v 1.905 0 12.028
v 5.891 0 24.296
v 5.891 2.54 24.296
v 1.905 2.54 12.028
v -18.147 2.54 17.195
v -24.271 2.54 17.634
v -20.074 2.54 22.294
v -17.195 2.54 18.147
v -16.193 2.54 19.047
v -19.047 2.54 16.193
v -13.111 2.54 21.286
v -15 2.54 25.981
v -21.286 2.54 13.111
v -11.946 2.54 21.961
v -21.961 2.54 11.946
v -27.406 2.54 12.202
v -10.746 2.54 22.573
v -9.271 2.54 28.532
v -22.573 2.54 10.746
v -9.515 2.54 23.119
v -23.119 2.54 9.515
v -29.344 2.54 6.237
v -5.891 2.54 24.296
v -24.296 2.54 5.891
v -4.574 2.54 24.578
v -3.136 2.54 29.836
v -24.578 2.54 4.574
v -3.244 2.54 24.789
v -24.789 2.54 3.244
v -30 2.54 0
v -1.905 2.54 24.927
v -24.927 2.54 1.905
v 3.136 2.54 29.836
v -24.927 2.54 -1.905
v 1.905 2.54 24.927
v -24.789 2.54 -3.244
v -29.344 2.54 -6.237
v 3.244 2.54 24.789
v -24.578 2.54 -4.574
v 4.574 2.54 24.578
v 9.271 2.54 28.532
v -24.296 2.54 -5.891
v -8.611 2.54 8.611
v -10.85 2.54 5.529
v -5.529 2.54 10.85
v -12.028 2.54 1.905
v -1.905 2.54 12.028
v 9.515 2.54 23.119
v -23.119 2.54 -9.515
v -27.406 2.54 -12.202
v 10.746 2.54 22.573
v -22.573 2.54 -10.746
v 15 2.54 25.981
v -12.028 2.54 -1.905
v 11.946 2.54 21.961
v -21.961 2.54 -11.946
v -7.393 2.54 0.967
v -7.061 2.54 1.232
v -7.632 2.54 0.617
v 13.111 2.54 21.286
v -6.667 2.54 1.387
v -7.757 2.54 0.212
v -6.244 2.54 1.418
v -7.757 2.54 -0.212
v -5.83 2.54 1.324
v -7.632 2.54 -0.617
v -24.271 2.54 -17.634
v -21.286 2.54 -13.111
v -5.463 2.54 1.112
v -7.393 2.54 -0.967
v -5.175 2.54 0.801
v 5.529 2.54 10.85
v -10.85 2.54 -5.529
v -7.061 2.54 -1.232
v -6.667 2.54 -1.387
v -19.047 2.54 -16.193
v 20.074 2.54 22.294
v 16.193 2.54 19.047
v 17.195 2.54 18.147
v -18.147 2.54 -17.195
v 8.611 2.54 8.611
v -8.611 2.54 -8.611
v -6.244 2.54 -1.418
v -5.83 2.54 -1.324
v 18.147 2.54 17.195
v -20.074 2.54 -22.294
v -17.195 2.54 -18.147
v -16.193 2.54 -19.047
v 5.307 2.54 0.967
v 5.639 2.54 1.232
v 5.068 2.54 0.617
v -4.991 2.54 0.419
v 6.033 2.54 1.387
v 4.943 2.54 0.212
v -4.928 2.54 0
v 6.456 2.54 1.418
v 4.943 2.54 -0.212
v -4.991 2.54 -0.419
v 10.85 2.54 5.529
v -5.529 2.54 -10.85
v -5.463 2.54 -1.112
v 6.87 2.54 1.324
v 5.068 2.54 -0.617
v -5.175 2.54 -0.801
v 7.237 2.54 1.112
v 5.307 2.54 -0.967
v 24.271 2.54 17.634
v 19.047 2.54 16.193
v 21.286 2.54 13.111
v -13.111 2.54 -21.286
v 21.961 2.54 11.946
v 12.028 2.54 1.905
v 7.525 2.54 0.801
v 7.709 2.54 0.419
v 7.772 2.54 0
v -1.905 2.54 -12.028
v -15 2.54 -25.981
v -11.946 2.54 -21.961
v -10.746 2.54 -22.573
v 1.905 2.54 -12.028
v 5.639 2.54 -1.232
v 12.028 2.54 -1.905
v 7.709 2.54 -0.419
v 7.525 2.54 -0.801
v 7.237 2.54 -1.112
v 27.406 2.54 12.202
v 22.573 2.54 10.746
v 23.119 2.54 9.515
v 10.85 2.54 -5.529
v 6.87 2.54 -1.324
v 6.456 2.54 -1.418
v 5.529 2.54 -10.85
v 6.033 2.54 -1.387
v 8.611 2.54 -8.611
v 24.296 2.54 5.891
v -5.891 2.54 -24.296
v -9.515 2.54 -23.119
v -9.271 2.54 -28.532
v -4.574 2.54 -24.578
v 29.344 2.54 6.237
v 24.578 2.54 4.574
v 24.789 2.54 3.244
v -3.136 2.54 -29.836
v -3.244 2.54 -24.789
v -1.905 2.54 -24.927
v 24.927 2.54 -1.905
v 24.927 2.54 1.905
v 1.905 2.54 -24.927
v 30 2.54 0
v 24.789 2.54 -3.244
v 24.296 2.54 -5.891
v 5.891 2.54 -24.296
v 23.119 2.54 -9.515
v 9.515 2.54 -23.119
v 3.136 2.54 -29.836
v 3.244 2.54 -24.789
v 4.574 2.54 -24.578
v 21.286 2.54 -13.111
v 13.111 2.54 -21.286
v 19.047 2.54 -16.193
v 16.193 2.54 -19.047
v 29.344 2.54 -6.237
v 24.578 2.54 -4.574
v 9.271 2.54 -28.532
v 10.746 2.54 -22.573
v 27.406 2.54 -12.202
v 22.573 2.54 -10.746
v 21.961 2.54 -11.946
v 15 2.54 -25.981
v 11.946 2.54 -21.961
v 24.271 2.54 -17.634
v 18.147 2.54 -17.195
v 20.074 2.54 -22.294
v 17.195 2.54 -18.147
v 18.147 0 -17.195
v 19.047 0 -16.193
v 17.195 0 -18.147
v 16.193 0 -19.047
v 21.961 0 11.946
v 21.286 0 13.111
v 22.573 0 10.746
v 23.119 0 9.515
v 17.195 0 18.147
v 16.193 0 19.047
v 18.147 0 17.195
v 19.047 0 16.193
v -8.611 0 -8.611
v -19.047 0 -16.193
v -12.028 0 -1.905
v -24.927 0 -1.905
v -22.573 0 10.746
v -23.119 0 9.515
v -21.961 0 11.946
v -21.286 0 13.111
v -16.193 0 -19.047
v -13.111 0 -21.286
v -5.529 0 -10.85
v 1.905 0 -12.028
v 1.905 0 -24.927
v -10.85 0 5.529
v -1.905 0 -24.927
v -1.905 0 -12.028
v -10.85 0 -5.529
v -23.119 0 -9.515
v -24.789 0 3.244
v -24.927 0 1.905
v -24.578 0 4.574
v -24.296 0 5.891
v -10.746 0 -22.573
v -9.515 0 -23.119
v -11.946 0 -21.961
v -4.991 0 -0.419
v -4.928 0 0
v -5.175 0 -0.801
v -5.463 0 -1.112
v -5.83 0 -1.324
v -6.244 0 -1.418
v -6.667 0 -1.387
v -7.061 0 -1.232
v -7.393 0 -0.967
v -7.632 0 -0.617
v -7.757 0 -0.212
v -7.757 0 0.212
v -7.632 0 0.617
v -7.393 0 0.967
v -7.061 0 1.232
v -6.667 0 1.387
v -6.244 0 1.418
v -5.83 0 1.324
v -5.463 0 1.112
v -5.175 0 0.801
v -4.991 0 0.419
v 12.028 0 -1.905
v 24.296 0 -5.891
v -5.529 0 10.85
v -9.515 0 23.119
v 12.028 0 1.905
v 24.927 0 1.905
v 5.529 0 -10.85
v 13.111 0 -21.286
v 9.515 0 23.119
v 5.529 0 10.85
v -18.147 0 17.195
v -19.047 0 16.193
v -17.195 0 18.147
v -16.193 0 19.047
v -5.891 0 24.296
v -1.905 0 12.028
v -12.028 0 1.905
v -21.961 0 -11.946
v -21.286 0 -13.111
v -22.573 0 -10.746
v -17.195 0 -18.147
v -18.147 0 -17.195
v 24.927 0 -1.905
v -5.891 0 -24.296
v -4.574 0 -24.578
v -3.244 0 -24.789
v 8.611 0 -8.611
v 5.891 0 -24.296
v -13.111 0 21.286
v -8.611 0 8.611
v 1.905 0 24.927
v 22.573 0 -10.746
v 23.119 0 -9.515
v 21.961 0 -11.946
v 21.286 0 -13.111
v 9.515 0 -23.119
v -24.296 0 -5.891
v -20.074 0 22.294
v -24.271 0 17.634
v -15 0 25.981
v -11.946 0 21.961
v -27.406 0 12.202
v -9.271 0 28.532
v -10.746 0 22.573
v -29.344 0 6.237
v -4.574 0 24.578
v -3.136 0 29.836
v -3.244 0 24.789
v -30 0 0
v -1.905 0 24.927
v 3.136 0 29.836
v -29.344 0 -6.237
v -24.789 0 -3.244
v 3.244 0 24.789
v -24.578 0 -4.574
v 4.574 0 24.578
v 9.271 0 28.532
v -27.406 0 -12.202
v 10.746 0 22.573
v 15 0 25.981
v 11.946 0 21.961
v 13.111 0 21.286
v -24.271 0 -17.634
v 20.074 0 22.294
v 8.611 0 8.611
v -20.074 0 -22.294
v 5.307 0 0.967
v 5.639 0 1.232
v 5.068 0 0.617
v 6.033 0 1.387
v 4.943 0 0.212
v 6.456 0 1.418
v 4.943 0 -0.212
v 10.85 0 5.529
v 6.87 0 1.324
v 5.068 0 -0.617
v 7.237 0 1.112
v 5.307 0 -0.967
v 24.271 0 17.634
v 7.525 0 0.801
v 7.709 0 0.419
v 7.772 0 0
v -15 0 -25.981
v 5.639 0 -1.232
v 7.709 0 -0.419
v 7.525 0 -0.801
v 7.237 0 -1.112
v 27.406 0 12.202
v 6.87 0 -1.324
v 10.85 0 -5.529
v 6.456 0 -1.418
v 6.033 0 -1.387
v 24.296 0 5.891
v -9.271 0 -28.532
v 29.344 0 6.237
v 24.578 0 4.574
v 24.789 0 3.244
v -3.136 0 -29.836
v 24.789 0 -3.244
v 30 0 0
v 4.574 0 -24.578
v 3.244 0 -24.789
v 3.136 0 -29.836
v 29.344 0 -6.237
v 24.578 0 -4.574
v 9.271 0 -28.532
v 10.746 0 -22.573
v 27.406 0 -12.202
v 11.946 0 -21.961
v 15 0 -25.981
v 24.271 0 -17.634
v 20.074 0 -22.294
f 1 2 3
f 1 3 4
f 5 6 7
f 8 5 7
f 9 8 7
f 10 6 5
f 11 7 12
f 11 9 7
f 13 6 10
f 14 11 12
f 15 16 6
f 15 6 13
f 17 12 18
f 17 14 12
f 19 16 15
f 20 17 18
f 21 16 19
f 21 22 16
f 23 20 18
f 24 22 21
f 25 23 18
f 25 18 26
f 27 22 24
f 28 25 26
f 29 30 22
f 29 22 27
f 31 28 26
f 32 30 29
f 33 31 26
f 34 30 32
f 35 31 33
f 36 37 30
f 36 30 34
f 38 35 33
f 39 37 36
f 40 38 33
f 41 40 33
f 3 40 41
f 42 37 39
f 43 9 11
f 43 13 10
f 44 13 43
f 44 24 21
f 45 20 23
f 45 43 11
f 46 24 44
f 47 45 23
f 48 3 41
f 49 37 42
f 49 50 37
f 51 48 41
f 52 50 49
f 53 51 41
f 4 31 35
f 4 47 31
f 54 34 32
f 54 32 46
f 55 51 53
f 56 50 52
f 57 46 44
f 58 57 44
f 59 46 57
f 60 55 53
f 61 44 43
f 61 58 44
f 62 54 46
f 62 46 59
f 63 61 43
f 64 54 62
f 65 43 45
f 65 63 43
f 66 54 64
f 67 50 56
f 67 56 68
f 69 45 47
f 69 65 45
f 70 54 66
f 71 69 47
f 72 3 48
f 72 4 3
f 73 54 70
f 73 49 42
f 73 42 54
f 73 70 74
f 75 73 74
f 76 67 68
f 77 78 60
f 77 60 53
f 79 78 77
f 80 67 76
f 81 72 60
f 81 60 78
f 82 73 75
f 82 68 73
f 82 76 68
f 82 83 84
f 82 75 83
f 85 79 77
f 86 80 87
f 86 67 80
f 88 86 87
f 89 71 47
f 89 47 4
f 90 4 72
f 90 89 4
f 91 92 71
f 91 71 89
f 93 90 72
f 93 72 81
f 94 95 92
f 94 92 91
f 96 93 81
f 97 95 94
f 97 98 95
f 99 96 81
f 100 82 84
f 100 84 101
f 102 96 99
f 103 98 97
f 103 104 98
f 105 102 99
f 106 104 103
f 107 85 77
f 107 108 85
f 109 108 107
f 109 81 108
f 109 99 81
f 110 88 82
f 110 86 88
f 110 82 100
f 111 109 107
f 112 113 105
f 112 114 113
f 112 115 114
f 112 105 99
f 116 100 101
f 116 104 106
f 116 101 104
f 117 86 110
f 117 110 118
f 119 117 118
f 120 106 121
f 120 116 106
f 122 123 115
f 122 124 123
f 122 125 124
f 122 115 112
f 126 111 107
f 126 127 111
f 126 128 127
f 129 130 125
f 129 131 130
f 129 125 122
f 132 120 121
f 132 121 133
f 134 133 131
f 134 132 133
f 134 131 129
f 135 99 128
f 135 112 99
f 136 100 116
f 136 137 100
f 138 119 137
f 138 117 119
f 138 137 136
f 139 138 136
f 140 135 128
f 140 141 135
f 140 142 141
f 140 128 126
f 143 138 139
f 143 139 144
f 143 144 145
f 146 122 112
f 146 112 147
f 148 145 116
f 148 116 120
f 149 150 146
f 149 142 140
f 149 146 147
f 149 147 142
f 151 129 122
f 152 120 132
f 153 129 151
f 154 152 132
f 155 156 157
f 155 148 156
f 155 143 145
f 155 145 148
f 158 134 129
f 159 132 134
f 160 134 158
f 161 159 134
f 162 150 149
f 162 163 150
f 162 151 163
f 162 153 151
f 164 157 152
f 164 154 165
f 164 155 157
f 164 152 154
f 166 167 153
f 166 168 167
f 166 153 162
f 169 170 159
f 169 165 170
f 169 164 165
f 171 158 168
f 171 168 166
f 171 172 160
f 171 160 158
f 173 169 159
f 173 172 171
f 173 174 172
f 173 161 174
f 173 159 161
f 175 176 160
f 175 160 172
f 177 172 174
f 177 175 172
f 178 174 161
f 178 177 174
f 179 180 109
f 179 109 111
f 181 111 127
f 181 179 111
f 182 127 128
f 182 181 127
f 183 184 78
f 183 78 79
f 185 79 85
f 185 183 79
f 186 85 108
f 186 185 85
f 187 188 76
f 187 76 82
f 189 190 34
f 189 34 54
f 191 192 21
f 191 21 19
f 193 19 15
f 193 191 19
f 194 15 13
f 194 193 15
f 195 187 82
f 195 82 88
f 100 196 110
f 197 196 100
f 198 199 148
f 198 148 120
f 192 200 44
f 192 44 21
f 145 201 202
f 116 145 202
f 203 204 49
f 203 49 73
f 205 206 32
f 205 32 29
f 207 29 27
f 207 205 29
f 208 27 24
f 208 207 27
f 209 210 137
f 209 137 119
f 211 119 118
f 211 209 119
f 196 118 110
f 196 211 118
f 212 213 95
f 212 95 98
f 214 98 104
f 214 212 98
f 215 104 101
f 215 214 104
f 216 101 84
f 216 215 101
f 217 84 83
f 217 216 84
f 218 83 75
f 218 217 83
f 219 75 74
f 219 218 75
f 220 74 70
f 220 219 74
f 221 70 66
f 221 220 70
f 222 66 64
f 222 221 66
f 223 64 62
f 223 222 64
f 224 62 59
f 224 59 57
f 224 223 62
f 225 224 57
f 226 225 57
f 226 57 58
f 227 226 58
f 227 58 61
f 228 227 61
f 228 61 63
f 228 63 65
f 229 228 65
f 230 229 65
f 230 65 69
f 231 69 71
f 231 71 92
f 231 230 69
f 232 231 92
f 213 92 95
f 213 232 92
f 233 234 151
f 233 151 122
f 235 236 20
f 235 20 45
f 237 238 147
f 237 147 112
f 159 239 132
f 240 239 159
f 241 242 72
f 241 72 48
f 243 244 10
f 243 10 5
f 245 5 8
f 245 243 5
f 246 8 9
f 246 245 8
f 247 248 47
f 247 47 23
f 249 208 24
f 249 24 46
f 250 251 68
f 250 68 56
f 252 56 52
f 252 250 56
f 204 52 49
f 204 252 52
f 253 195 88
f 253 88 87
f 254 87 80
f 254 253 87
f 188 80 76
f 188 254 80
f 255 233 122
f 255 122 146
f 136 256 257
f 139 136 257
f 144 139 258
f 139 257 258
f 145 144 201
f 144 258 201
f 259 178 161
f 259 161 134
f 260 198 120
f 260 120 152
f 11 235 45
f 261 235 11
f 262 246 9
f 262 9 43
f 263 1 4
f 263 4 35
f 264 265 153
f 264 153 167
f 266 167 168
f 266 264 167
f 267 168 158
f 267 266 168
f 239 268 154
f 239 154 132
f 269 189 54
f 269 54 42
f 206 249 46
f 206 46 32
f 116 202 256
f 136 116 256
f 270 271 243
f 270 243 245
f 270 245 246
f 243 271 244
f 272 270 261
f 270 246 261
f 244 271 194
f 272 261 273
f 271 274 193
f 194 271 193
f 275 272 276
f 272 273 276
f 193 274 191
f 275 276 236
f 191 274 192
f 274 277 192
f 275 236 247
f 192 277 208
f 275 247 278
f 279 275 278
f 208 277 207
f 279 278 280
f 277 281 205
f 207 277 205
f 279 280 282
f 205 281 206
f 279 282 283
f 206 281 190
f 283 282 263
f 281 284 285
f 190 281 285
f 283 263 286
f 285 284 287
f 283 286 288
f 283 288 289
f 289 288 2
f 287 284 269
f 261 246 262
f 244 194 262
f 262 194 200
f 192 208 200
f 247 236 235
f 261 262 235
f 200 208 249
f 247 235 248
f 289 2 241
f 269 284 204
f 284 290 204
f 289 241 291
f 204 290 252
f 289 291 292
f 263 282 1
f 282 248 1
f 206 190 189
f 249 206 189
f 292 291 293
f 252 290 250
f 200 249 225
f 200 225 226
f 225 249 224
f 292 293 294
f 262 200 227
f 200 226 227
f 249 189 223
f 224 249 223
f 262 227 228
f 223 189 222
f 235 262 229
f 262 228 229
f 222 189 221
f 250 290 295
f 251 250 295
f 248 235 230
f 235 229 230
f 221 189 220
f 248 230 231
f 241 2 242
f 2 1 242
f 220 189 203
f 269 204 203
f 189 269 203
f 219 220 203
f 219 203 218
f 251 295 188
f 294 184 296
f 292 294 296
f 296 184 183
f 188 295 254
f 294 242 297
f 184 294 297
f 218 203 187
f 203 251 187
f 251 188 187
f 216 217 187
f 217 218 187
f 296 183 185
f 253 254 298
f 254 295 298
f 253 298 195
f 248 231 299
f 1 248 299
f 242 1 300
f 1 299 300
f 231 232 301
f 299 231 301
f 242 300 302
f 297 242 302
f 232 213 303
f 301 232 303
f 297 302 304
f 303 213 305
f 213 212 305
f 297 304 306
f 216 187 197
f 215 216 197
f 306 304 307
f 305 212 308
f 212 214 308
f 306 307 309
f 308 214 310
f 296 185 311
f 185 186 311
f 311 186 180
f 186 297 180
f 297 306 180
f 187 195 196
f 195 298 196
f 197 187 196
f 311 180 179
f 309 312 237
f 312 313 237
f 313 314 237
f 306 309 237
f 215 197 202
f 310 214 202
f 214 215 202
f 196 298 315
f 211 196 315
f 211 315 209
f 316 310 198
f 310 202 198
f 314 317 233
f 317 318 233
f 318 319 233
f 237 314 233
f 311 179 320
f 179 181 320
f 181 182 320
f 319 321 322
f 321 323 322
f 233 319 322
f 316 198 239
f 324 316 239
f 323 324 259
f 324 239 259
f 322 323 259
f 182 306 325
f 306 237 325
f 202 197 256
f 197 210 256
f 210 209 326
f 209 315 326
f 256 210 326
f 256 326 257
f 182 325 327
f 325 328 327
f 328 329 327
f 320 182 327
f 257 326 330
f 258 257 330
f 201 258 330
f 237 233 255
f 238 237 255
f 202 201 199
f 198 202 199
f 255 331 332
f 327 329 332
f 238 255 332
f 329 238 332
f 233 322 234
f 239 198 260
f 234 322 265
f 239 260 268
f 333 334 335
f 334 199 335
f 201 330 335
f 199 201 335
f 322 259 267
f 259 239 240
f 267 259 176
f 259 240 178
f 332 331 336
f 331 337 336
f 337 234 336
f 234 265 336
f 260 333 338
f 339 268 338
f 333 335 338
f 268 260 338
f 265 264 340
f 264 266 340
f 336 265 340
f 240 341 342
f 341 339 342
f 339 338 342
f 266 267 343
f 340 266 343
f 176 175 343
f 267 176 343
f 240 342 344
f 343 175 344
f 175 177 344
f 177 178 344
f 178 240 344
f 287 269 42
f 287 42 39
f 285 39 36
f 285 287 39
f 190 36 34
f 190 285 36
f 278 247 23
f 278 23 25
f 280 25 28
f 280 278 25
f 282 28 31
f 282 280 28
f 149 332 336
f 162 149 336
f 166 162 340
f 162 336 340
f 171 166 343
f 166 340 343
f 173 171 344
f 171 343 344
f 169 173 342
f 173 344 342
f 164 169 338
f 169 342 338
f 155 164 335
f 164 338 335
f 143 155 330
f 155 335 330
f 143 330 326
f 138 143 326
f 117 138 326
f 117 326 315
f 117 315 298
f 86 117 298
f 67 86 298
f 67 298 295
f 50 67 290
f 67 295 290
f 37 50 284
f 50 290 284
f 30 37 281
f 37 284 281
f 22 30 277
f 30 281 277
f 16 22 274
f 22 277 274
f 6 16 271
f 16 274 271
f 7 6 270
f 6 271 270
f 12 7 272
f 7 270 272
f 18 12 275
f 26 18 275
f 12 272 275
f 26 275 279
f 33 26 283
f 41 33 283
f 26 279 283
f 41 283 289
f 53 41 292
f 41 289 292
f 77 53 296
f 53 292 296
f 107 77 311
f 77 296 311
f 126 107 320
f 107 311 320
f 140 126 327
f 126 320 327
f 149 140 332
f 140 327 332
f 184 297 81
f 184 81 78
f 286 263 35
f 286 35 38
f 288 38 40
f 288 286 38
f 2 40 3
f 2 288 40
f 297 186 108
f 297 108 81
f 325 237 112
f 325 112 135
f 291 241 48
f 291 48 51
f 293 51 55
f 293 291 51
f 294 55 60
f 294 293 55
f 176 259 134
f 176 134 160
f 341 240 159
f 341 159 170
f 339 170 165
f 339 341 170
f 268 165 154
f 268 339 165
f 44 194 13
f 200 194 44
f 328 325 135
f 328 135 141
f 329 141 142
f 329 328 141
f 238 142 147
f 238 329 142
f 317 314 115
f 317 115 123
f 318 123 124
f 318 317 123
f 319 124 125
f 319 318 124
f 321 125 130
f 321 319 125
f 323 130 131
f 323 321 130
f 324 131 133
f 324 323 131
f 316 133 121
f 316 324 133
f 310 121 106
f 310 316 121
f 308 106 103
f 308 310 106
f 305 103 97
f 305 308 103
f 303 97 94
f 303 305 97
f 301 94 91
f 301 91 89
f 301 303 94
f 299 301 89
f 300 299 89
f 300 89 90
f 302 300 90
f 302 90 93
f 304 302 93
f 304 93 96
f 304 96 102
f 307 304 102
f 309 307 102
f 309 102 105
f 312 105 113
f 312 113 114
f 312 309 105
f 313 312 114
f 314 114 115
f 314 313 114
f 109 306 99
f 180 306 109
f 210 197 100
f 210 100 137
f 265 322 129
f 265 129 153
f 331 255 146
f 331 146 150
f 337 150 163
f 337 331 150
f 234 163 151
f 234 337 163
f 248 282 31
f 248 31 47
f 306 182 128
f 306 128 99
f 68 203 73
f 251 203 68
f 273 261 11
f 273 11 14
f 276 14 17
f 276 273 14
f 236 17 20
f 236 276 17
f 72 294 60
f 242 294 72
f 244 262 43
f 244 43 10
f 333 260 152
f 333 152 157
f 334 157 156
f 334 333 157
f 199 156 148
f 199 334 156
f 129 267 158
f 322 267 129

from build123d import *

# Parameters (mm, degrees)
SKETCH1_R           = 30
SKETCH1_R_2         = 1.4224
BOSS_EXTRUDE1_DEPTH = 2.54


with BuildPart() as part:
    # Sketch1 → Boss-Extrude1 (new body)
    with BuildSketch(Plane(origin=(0, 0, 0), x_dir=(1, 0, 0), z_dir=(0, 1, 0))):
        Circle(SKETCH1_R)
        with Locations((6.35, 0)):
            Circle(SKETCH1_R_2, mode=Mode.SUBTRACT)
        with Locations((-6.35, 0)):
            Circle(SKETCH1_R_2, mode=Mode.SUBTRACT)
        with BuildLine():
            Line((-1.905, 24.927313873), (-1.905, 12.027696635))
            Line((-1.905, 12.027696635), (-5.891200947, 24.295961666))
            ThreePointArc((-5.891200947, 24.295961666), (-3.910861632, 24.692208552), (-1.905, 24.927313873))
        make_face(mode=Mode.SUBTRACT)
        with BuildLine():
            Line((1.905, 24.927313873), (1.905, 12.027696635))
            Line((1.905, 12.027696635), (5.891200947, 24.295961666))
            ThreePointArc((5.891200947, 24.295961666), (3.910861632, 24.692208552), (1.905, 24.927313873))
        make_face(mode=Mode.SUBTRACT)
        with BuildLine():
            Line((9.514726274, 23.118606918), (5.528525327, 10.850341887))
            Line((5.528525327, 10.850341887), (13.110730099, 21.286351453))
            ThreePointArc((13.110730099, 21.286351453), (11.349762511, 22.275163139), (9.514726274, 23.118606918))
        make_face(mode=Mode.SUBTRACT)
        with BuildLine():
            Line((16.193084848, 19.046889641), (8.610880076, 8.610880076))
            Line((8.610880076, 8.610880076), (19.046889641, 16.193084848))
            ThreePointArc((19.046889641, 16.193084848), (17.677669557, 17.677669557), (16.193084848, 19.046889641))
        make_face(mode=Mode.SUBTRACT)
        with BuildLine():
            Line((21.286351453, 13.110730099), (10.850341887, 5.528525327))
            Line((10.850341887, 5.528525327), (23.118606918, 9.514726274))
            ThreePointArc((23.118606918, 9.514726274), (22.275163139, 11.349762511), (21.286351453, 13.110730099))
        make_face(mode=Mode.SUBTRACT)
        with BuildLine():
            Line((24.295961666, 5.891200947), (12.027696635, 1.905))
            Line((12.027696635, 1.905), (24.927313873, 1.905))
            ThreePointArc((24.927313873, 1.905), (24.692208552, 3.910861632), (24.295961666, 5.891200947))
        make_face(mode=Mode.SUBTRACT)
        with BuildLine():
            Line((24.927313873, -1.905), (12.027696635, -1.905))
            Line((12.027696635, -1.905), (24.295961666, -5.891200947))
            ThreePointArc((24.295961666, -5.891200947), (24.692208552, -3.910861632), (24.927313873, -1.905))
        make_face(mode=Mode.SUBTRACT)
        with BuildLine():
            Line((23.118606918, -9.514726274), (10.850341887, -5.528525327))
            Line((10.850341887, -5.528525327), (21.286351453, -13.110730099))
            ThreePointArc((21.286351453, -13.110730099), (22.275163139, -11.349762511), (23.118606918, -9.514726274))
        make_face(mode=Mode.SUBTRACT)
        with BuildLine():
            Line((19.046889641, -16.193084848), (8.610880076, -8.610880076))
            Line((8.610880076, -8.610880076), (16.193084848, -19.046889641))
            ThreePointArc((16.193084848, -19.046889641), (17.677669557, -17.677669557), (19.046889641, -16.193084848))
        make_face(mode=Mode.SUBTRACT)
        with BuildLine():
            Line((13.110730099, -21.286351453), (5.528525327, -10.850341887))
            Line((5.528525327, -10.850341887), (9.514726274, -23.118606918))
            ThreePointArc((9.514726274, -23.118606918), (11.349762511, -22.275163139), (13.110730099, -21.286351453))
        make_face(mode=Mode.SUBTRACT)
        with BuildLine():
            Line((5.891200947, -24.295961666), (1.905, -12.027696635))
            Line((1.905, -12.027696635), (1.905, -24.927313873))
            ThreePointArc((1.905, -24.927313873), (3.910861632, -24.692208552), (5.891200947, -24.295961666))
        make_face(mode=Mode.SUBTRACT)
        with BuildLine():
            Line((-1.905, -24.927313873), (-1.905, -12.027696635))
            Line((-1.905, -12.027696635), (-5.891200947, -24.295961666))
            ThreePointArc((-5.891200947, -24.295961666), (-3.910861632, -24.692208552), (-1.905, -24.927313873))
        make_face(mode=Mode.SUBTRACT)
        with BuildLine():
            Line((-9.514726274, -23.118606918), (-5.528525327, -10.850341887))
            Line((-5.528525327, -10.850341887), (-13.110730099, -21.286351453))
            ThreePointArc((-13.110730099, -21.286351453), (-11.349762511, -22.275163139), (-9.514726274, -23.118606918))
        make_face(mode=Mode.SUBTRACT)
        with BuildLine():
            Line((-16.193084848, -19.046889641), (-8.610880076, -8.610880076))
            Line((-8.610880076, -8.610880076), (-19.046889641, -16.193084848))
            ThreePointArc((-19.046889641, -16.193084848), (-17.677669557, -17.677669557), (-16.193084848, -19.046889641))
        make_face(mode=Mode.SUBTRACT)
        with BuildLine():
            Line((-21.286351453, -13.110730099), (-10.850341887, -5.528525327))
            Line((-10.850341887, -5.528525327), (-23.118606918, -9.514726274))
            ThreePointArc((-23.118606918, -9.514726274), (-22.275163139, -11.349762511), (-21.286351453, -13.110730099))
        make_face(mode=Mode.SUBTRACT)
        with BuildLine():
            Line((-24.295961666, -5.891200947), (-12.027696635, -1.905))
            Line((-12.027696635, -1.905), (-24.927313873, -1.905))
            ThreePointArc((-24.927313873, -1.905), (-24.692208552, -3.910861632), (-24.295961666, -5.891200947))
        make_face(mode=Mode.SUBTRACT)
        with BuildLine():
            Line((-24.927313873, 1.905), (-12.027696635, 1.905))
            Line((-12.027696635, 1.905), (-24.295961666, 5.891200947))
            ThreePointArc((-24.295961666, 5.891200947), (-24.692208552, 3.910861632), (-24.927313873, 1.905))
        make_face(mode=Mode.SUBTRACT)
        with BuildLine():
            Line((-23.118606918, 9.514726274), (-10.850341887, 5.528525327))
            Line((-10.850341887, 5.528525327), (-21.286351453, 13.110730099))
            ThreePointArc((-21.286351453, 13.110730099), (-22.275163139, 11.349762511), (-23.118606918, 9.514726274))
        make_face(mode=Mode.SUBTRACT)
        with BuildLine():
            Line((-19.046889641, 16.193084848), (-8.610880076, 8.610880076))
            Line((-8.610880076, 8.610880076), (-16.193084848, 19.046889641))
            ThreePointArc((-16.193084848, 19.046889641), (-17.677669557, 17.677669557), (-19.046889641, 16.193084848))
        make_face(mode=Mode.SUBTRACT)
        with BuildLine():
            Line((-13.110730099, 21.286351453), (-5.528525327, 10.850341887))
            Line((-5.528525327, 10.850341887), (-9.514726274, 23.118606918))
            ThreePointArc((-9.514726274, 23.118606918), (-11.349762511, 22.275163139), (-13.110730099, 21.286351453))
        make_face(mode=Mode.SUBTRACT)
    extrude(amount=BOSS_EXTRUDE1_DEPTH)


solid = part.part
